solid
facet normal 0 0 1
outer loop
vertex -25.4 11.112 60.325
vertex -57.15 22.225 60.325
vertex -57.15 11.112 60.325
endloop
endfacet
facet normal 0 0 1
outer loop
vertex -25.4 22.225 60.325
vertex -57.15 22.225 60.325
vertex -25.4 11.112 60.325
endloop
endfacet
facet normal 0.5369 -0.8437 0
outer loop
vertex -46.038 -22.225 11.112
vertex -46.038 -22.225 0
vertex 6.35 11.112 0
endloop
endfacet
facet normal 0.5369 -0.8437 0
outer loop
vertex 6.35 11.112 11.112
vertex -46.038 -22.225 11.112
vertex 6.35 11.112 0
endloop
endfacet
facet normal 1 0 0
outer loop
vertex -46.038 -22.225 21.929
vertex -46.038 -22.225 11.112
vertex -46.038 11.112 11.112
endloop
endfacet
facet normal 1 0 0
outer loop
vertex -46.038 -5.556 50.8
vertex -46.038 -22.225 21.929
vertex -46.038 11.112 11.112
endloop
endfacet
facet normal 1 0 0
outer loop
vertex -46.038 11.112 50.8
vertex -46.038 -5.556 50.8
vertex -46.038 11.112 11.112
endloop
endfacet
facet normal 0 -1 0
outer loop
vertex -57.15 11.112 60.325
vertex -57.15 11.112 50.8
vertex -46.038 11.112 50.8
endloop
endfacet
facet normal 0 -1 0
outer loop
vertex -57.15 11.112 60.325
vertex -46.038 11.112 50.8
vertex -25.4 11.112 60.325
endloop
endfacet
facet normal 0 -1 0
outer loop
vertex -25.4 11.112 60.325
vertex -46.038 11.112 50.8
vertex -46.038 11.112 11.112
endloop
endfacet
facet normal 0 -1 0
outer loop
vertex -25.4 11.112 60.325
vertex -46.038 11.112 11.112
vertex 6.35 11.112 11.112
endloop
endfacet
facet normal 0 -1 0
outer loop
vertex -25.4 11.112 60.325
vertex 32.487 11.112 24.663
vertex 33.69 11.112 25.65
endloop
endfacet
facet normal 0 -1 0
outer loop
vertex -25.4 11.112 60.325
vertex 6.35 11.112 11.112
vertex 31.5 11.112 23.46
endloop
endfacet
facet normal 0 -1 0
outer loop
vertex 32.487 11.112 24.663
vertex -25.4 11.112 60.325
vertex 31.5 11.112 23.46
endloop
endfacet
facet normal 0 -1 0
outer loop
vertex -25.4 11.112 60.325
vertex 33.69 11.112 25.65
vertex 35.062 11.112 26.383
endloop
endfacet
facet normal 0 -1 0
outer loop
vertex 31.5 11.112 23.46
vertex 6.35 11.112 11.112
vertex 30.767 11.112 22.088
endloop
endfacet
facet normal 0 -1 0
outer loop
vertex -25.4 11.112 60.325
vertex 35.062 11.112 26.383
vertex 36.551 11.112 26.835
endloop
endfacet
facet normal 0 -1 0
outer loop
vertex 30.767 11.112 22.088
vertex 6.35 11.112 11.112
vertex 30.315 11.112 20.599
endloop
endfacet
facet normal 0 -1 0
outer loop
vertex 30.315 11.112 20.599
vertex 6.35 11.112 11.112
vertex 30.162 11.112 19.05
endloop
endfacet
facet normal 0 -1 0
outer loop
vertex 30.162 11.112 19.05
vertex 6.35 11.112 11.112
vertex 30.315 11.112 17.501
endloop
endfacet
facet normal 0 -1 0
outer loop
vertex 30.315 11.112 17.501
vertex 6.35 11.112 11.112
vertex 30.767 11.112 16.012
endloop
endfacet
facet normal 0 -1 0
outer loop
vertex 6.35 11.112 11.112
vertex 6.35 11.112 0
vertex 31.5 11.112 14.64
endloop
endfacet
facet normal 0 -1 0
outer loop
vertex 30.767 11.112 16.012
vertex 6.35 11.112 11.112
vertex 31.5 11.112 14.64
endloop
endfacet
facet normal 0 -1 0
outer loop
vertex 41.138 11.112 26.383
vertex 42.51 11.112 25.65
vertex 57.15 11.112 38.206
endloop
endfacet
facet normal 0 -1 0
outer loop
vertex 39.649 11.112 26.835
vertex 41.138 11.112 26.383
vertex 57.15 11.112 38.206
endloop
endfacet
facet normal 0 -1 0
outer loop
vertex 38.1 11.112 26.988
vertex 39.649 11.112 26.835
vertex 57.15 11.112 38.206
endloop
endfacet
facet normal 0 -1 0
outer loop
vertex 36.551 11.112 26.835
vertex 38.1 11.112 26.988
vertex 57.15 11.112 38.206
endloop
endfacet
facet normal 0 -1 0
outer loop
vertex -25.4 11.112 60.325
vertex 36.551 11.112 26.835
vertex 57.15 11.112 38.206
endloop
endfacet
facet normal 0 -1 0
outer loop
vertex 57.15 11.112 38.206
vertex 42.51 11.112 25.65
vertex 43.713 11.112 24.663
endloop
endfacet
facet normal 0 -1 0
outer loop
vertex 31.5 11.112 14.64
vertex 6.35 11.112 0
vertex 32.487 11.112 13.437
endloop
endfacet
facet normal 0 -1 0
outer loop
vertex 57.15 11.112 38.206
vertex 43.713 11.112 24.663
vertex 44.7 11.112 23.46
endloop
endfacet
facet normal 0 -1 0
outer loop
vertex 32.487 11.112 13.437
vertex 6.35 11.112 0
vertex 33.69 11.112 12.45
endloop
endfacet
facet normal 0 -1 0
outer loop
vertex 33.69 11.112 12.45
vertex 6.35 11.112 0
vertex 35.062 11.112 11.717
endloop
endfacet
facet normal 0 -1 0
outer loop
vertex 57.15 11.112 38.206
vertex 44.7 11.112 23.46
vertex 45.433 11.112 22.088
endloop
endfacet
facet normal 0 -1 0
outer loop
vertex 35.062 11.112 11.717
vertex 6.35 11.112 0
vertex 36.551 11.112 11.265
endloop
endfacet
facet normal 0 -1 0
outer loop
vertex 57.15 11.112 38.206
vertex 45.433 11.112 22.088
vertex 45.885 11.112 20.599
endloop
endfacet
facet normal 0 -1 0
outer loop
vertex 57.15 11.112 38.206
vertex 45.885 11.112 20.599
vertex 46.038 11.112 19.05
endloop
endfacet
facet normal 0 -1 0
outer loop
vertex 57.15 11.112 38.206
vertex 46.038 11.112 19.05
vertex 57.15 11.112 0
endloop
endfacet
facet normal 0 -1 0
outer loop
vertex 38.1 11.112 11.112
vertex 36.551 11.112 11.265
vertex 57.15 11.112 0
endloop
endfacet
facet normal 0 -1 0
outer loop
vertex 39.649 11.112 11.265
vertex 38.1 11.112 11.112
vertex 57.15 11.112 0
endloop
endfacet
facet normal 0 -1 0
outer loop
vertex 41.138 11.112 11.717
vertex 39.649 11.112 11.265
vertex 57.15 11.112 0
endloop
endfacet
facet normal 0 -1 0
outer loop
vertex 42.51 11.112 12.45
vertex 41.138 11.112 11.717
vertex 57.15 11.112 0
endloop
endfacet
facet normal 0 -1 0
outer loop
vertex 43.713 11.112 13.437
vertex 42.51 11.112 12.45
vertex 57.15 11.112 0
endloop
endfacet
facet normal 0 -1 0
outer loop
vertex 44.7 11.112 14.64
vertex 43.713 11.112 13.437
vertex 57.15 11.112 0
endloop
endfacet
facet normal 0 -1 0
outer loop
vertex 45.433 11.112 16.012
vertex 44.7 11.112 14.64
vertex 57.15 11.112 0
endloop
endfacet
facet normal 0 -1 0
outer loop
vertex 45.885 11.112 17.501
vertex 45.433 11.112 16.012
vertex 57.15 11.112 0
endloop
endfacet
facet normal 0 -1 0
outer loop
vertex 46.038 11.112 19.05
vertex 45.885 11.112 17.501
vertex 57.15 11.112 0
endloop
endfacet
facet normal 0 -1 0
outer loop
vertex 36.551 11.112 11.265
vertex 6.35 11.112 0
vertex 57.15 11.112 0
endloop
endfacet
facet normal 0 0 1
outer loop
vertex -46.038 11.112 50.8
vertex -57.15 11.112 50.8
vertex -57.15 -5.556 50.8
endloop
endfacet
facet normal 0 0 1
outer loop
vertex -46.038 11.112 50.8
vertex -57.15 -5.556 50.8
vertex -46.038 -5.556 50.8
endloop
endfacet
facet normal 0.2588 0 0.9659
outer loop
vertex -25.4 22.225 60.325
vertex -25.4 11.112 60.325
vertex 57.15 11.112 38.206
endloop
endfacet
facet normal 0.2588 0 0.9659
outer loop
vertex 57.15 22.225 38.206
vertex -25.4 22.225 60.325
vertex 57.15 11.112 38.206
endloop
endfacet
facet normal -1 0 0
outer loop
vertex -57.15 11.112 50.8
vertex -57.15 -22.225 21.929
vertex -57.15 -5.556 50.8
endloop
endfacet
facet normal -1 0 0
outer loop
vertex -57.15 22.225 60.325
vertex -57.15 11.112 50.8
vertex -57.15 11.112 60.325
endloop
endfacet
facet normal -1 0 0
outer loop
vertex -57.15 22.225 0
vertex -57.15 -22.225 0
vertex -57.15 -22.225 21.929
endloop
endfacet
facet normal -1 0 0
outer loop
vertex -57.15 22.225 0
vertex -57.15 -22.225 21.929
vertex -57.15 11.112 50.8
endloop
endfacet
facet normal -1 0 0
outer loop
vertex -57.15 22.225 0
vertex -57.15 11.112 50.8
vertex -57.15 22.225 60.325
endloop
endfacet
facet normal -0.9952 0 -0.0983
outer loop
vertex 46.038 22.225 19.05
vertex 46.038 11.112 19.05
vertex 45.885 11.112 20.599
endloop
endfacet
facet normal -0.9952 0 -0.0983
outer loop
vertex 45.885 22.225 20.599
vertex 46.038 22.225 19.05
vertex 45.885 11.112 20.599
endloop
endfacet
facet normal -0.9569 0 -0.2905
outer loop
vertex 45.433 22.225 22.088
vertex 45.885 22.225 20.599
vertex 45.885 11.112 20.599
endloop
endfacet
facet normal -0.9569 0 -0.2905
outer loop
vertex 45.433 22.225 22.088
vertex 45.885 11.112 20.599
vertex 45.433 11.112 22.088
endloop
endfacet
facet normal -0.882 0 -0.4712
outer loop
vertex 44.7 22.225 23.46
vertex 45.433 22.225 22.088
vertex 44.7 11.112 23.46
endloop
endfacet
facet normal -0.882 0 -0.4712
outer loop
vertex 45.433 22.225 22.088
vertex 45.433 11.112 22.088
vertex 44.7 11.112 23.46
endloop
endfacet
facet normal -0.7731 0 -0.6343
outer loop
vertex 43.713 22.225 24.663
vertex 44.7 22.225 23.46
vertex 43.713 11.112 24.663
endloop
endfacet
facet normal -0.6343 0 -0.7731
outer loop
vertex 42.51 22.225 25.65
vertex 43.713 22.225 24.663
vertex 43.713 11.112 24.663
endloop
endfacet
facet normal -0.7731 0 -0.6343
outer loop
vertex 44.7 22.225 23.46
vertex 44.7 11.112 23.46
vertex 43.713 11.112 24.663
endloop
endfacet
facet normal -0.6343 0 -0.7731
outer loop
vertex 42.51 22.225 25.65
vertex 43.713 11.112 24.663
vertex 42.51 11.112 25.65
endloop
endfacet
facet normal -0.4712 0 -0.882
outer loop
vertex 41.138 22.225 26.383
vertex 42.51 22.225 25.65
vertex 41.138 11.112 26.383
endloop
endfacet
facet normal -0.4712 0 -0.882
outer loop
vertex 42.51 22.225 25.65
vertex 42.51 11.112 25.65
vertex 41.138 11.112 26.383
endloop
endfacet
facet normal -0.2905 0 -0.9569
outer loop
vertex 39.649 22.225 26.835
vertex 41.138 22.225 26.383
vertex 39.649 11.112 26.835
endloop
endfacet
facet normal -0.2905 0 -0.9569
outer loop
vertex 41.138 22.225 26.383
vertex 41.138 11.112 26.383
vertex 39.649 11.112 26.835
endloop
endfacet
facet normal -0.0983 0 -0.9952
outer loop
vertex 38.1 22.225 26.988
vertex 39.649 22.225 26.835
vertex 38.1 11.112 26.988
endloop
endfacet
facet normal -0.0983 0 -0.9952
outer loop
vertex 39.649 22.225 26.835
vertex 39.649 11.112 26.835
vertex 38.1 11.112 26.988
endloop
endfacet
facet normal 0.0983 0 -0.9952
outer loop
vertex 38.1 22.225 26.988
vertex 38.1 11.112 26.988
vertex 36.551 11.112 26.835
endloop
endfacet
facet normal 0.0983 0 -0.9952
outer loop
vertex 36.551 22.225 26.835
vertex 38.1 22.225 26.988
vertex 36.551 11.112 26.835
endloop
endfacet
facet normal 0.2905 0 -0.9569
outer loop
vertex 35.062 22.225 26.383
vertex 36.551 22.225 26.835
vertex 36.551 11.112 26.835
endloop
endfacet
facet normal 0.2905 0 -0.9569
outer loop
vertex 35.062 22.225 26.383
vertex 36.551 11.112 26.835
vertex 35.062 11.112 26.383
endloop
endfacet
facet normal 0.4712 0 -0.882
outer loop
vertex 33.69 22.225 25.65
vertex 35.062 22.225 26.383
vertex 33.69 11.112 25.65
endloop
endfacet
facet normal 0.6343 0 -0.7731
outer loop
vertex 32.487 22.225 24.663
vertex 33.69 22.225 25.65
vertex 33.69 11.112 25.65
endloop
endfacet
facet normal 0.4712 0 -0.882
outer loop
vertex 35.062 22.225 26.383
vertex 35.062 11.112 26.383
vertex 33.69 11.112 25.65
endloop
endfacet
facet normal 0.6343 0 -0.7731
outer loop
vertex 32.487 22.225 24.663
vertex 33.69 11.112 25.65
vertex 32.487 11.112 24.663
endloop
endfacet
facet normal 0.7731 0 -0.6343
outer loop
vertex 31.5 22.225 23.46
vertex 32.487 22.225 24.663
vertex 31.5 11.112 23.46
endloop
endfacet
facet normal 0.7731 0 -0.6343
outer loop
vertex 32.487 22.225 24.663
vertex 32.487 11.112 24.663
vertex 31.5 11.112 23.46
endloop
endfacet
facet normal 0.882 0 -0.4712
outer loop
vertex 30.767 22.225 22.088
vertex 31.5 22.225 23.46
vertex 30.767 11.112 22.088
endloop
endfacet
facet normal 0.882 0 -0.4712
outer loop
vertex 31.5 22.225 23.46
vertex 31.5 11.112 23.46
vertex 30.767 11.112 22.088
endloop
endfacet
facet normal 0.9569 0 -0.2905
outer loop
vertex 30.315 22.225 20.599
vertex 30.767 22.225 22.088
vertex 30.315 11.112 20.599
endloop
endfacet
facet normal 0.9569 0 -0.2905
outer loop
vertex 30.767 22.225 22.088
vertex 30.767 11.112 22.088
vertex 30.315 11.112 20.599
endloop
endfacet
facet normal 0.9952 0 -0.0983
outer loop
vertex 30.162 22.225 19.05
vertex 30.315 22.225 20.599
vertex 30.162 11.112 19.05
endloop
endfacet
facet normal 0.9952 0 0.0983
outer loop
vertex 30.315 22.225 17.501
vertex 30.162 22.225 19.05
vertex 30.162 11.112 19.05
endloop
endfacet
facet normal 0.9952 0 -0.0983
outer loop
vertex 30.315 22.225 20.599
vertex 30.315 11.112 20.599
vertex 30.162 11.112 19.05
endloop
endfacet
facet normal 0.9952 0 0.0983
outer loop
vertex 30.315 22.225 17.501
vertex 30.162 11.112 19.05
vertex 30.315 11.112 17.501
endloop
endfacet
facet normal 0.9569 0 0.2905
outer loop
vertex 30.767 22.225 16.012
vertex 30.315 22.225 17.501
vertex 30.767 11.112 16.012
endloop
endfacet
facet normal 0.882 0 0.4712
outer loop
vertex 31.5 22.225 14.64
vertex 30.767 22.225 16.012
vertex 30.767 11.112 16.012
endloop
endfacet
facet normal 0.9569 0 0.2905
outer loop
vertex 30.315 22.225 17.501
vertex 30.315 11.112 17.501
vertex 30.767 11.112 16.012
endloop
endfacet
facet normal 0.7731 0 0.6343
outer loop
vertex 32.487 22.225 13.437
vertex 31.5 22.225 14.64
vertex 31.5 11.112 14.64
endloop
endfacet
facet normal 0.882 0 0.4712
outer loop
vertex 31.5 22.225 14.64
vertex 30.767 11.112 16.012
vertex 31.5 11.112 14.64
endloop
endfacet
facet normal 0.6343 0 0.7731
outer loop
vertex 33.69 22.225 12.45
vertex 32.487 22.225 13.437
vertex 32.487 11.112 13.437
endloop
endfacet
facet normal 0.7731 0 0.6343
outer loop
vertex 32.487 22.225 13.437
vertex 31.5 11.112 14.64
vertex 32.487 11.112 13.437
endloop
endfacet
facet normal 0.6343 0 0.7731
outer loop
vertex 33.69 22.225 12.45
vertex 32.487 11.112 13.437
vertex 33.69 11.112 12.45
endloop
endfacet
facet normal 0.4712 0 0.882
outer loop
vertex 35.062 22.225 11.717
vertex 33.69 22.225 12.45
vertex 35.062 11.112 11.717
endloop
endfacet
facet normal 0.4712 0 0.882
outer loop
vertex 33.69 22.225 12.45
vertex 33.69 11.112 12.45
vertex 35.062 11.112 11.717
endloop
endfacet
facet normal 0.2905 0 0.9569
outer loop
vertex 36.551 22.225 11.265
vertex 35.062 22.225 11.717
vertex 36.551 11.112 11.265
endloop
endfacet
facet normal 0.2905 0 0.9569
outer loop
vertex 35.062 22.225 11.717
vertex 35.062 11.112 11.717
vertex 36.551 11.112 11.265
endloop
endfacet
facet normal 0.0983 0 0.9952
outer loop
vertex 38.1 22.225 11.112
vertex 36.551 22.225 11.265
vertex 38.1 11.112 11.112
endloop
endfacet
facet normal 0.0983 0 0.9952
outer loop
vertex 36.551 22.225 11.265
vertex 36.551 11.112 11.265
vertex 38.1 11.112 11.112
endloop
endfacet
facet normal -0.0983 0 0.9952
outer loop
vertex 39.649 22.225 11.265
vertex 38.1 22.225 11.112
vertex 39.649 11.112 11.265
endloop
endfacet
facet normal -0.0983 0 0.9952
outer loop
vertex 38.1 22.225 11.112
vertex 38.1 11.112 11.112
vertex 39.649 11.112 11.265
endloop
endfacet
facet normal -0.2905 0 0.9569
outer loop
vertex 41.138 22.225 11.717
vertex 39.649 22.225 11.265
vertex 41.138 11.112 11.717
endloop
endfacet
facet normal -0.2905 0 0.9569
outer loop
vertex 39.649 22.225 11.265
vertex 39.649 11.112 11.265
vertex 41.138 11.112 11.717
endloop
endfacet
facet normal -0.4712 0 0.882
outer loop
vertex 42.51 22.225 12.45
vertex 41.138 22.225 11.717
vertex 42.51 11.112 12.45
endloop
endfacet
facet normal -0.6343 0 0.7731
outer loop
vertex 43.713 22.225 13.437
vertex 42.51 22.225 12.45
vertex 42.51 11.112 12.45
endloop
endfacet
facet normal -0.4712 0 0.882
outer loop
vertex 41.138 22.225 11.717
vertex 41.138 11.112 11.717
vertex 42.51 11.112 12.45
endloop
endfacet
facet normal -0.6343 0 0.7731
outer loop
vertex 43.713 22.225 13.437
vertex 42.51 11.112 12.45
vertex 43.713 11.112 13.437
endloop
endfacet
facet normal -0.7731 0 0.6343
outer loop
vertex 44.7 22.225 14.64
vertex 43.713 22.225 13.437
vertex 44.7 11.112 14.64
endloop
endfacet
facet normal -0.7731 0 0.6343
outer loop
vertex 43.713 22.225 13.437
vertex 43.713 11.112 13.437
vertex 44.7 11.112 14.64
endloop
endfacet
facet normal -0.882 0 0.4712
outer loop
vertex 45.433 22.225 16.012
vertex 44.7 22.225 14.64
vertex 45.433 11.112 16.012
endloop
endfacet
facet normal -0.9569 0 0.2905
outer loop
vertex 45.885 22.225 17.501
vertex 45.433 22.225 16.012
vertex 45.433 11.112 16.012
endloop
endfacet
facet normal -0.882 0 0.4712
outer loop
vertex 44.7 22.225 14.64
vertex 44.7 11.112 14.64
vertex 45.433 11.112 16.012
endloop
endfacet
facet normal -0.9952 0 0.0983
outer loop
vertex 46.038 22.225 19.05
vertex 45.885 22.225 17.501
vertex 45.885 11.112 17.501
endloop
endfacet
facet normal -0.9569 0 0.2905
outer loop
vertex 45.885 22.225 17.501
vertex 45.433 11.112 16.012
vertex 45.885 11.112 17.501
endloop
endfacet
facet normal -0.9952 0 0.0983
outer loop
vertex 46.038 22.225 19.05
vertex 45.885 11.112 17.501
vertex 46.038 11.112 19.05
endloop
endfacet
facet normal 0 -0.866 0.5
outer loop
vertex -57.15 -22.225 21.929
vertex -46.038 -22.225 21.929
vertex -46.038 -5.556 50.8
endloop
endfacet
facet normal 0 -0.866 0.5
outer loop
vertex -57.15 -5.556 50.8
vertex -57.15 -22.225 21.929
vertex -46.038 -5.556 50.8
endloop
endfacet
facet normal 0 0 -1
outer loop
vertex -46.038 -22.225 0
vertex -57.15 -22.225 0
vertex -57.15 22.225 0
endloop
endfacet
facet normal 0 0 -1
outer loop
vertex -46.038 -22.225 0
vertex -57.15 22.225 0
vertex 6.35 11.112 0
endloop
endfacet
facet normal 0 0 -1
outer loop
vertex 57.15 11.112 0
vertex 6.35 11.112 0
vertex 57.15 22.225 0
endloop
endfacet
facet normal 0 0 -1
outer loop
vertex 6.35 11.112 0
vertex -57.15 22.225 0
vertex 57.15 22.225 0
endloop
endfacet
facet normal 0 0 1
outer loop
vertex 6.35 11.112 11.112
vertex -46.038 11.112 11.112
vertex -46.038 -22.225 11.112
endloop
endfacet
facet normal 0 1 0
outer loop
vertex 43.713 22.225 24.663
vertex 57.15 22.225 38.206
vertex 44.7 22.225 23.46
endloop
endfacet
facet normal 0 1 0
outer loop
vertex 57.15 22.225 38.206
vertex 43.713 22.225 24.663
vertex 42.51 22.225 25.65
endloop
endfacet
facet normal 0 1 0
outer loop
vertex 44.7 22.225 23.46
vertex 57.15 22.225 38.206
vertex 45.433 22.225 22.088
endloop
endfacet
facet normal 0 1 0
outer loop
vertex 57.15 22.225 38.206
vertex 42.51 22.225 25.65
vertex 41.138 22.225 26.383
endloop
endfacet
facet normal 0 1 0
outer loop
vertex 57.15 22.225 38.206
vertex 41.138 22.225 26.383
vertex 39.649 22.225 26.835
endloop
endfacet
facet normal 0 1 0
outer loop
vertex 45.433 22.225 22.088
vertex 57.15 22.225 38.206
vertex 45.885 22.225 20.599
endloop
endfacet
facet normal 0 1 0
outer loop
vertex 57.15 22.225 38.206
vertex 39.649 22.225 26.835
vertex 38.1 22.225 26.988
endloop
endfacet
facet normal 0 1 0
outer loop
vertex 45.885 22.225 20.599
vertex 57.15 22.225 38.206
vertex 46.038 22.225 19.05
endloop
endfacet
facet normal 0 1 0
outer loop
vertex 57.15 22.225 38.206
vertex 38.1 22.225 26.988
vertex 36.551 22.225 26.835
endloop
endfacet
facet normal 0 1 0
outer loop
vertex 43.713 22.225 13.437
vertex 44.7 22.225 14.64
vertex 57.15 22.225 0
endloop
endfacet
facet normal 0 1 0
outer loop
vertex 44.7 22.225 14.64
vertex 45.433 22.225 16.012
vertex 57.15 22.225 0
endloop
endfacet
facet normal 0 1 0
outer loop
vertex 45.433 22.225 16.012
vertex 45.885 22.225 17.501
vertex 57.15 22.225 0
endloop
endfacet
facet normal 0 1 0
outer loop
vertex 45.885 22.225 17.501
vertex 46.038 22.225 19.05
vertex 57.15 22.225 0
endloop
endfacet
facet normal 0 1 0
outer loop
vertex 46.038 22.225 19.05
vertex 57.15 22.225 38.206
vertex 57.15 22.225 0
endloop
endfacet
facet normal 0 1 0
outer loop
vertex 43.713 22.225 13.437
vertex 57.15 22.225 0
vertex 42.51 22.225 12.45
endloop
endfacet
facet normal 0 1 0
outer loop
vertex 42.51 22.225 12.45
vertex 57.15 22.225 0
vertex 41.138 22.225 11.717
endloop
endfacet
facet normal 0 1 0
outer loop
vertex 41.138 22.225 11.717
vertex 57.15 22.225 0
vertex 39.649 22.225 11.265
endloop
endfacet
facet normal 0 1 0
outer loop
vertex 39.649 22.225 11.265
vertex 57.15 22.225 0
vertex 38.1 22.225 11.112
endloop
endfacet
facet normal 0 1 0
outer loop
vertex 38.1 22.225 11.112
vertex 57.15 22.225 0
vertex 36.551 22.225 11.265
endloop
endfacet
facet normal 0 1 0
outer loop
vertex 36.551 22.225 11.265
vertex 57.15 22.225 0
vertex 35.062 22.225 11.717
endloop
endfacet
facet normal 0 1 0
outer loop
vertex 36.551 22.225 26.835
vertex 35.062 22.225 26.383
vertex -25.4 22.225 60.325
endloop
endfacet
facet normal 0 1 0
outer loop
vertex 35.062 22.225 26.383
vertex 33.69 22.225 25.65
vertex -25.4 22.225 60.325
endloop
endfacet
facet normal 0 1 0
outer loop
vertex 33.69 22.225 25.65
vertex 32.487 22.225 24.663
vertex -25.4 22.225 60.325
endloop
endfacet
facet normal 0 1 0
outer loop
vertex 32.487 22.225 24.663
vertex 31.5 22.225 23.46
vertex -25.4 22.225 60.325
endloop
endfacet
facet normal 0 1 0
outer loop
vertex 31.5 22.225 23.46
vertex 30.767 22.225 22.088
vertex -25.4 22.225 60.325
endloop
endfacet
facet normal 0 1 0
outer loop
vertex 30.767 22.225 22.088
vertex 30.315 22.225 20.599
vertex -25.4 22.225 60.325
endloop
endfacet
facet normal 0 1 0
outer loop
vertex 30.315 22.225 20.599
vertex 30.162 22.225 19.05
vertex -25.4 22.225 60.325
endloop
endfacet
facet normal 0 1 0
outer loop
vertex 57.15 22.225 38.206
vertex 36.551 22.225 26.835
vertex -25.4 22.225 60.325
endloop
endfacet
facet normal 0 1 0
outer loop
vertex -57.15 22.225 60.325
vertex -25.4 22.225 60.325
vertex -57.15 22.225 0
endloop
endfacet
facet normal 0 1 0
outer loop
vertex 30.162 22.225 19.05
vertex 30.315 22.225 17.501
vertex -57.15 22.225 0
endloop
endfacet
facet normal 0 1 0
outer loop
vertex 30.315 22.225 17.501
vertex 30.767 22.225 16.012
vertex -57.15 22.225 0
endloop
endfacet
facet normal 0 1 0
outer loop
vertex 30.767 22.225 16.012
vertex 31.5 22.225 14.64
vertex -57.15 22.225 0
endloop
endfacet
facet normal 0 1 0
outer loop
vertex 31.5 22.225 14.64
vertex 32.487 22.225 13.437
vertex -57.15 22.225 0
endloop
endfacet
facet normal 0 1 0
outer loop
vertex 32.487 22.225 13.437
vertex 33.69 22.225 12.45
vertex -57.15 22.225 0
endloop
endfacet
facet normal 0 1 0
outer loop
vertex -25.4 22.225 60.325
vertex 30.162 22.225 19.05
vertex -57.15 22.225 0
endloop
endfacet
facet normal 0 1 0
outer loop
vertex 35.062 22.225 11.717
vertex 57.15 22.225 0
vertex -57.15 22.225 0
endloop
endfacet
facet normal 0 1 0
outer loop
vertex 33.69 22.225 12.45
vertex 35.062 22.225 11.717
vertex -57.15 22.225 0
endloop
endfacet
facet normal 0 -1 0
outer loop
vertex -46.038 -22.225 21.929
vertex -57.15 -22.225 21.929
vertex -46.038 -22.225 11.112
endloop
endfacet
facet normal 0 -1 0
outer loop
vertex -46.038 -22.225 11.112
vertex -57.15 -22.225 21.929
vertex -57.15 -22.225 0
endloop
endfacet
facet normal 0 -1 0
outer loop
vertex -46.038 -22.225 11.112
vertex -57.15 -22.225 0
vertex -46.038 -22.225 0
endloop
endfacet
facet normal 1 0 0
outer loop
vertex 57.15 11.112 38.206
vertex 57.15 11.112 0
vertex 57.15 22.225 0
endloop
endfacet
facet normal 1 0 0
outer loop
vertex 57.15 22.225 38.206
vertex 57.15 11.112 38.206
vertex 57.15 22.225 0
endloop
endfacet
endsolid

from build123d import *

# Parameters (mm, degrees)
F1_DEPTH = 11.1125
F2_DEPTH = 60.325
F0_W     = 11.1125
F0_H     = 33.3375
F3_DEPTH = 50.8
F6_DEPTH = 11.1125
F7_DEPTH = 11.1125
F4_R     = 7.9375
F8_DEPTH = 11.1125


# Not quite as in the source:
# - a length typed as a fraction of an inch, garbled in the dataset ("3 / 203.2 mm" for 3/8 in), is restored


with BuildPart() as f1:
    # F0 (on Top) → F1 (new body)
    with BuildSketch(Plane.XY):
        Polygon((-46.0375, 11.1125), (-46.0375, -22.225), (6.35, 11.1125), (-25.4, 11.1125), align=None)
    extrude(amount=F1_DEPTH)

    # F0 (on Top) → F2 (join)
    with BuildSketch(Plane.XY):
        Polygon((-57.15, 11.1125), (-46.0375, 11.1125), (-25.4, 11.1125), (-25.4, 22.225), (-57.15, 22.225), align=None)
        Polygon((-25.4, 11.1125), (6.35, 11.1125), (57.15, 11.1125), (57.15, 22.225), (-25.4, 22.225), align=None)
    extrude(amount=F2_DEPTH)

    # F0 (on Top) → F3 (join)
    with BuildSketch(Plane.XY):
        with Locations((-51.59375, -5.55625)):
            Rectangle(F0_W, F0_H)
    extrude(amount=F3_DEPTH)

    # F5 (on face) → F6 (cut)
    with BuildSketch(Plane.YZ.offset(-46.0375)):
        Polygon((-22.225, 50.8), (-22.225, 21.9288781013), (-5.55625, 50.8), align=None)
    extrude(amount=-F6_DEPTH, mode=Mode.SUBTRACT)

    # F4 (on face) → F7 (cut)
    with BuildSketch(Plane.XZ.offset(-11.1125)):
        Polygon((57.15, 60.325), (-25.4, 60.325), (57.15, 38.2057941648), align=None)
    extrude(amount=-F7_DEPTH, mode=Mode.SUBTRACT)

    # F4 (on face) → F8 (cut)
    with BuildSketch(Plane.XZ.offset(-11.1125)):
        with Locations((38.1, 19.05)):
            Circle(F4_R)
    extrude(amount=-F8_DEPTH, mode=Mode.SUBTRACT)


solid = f1.part
